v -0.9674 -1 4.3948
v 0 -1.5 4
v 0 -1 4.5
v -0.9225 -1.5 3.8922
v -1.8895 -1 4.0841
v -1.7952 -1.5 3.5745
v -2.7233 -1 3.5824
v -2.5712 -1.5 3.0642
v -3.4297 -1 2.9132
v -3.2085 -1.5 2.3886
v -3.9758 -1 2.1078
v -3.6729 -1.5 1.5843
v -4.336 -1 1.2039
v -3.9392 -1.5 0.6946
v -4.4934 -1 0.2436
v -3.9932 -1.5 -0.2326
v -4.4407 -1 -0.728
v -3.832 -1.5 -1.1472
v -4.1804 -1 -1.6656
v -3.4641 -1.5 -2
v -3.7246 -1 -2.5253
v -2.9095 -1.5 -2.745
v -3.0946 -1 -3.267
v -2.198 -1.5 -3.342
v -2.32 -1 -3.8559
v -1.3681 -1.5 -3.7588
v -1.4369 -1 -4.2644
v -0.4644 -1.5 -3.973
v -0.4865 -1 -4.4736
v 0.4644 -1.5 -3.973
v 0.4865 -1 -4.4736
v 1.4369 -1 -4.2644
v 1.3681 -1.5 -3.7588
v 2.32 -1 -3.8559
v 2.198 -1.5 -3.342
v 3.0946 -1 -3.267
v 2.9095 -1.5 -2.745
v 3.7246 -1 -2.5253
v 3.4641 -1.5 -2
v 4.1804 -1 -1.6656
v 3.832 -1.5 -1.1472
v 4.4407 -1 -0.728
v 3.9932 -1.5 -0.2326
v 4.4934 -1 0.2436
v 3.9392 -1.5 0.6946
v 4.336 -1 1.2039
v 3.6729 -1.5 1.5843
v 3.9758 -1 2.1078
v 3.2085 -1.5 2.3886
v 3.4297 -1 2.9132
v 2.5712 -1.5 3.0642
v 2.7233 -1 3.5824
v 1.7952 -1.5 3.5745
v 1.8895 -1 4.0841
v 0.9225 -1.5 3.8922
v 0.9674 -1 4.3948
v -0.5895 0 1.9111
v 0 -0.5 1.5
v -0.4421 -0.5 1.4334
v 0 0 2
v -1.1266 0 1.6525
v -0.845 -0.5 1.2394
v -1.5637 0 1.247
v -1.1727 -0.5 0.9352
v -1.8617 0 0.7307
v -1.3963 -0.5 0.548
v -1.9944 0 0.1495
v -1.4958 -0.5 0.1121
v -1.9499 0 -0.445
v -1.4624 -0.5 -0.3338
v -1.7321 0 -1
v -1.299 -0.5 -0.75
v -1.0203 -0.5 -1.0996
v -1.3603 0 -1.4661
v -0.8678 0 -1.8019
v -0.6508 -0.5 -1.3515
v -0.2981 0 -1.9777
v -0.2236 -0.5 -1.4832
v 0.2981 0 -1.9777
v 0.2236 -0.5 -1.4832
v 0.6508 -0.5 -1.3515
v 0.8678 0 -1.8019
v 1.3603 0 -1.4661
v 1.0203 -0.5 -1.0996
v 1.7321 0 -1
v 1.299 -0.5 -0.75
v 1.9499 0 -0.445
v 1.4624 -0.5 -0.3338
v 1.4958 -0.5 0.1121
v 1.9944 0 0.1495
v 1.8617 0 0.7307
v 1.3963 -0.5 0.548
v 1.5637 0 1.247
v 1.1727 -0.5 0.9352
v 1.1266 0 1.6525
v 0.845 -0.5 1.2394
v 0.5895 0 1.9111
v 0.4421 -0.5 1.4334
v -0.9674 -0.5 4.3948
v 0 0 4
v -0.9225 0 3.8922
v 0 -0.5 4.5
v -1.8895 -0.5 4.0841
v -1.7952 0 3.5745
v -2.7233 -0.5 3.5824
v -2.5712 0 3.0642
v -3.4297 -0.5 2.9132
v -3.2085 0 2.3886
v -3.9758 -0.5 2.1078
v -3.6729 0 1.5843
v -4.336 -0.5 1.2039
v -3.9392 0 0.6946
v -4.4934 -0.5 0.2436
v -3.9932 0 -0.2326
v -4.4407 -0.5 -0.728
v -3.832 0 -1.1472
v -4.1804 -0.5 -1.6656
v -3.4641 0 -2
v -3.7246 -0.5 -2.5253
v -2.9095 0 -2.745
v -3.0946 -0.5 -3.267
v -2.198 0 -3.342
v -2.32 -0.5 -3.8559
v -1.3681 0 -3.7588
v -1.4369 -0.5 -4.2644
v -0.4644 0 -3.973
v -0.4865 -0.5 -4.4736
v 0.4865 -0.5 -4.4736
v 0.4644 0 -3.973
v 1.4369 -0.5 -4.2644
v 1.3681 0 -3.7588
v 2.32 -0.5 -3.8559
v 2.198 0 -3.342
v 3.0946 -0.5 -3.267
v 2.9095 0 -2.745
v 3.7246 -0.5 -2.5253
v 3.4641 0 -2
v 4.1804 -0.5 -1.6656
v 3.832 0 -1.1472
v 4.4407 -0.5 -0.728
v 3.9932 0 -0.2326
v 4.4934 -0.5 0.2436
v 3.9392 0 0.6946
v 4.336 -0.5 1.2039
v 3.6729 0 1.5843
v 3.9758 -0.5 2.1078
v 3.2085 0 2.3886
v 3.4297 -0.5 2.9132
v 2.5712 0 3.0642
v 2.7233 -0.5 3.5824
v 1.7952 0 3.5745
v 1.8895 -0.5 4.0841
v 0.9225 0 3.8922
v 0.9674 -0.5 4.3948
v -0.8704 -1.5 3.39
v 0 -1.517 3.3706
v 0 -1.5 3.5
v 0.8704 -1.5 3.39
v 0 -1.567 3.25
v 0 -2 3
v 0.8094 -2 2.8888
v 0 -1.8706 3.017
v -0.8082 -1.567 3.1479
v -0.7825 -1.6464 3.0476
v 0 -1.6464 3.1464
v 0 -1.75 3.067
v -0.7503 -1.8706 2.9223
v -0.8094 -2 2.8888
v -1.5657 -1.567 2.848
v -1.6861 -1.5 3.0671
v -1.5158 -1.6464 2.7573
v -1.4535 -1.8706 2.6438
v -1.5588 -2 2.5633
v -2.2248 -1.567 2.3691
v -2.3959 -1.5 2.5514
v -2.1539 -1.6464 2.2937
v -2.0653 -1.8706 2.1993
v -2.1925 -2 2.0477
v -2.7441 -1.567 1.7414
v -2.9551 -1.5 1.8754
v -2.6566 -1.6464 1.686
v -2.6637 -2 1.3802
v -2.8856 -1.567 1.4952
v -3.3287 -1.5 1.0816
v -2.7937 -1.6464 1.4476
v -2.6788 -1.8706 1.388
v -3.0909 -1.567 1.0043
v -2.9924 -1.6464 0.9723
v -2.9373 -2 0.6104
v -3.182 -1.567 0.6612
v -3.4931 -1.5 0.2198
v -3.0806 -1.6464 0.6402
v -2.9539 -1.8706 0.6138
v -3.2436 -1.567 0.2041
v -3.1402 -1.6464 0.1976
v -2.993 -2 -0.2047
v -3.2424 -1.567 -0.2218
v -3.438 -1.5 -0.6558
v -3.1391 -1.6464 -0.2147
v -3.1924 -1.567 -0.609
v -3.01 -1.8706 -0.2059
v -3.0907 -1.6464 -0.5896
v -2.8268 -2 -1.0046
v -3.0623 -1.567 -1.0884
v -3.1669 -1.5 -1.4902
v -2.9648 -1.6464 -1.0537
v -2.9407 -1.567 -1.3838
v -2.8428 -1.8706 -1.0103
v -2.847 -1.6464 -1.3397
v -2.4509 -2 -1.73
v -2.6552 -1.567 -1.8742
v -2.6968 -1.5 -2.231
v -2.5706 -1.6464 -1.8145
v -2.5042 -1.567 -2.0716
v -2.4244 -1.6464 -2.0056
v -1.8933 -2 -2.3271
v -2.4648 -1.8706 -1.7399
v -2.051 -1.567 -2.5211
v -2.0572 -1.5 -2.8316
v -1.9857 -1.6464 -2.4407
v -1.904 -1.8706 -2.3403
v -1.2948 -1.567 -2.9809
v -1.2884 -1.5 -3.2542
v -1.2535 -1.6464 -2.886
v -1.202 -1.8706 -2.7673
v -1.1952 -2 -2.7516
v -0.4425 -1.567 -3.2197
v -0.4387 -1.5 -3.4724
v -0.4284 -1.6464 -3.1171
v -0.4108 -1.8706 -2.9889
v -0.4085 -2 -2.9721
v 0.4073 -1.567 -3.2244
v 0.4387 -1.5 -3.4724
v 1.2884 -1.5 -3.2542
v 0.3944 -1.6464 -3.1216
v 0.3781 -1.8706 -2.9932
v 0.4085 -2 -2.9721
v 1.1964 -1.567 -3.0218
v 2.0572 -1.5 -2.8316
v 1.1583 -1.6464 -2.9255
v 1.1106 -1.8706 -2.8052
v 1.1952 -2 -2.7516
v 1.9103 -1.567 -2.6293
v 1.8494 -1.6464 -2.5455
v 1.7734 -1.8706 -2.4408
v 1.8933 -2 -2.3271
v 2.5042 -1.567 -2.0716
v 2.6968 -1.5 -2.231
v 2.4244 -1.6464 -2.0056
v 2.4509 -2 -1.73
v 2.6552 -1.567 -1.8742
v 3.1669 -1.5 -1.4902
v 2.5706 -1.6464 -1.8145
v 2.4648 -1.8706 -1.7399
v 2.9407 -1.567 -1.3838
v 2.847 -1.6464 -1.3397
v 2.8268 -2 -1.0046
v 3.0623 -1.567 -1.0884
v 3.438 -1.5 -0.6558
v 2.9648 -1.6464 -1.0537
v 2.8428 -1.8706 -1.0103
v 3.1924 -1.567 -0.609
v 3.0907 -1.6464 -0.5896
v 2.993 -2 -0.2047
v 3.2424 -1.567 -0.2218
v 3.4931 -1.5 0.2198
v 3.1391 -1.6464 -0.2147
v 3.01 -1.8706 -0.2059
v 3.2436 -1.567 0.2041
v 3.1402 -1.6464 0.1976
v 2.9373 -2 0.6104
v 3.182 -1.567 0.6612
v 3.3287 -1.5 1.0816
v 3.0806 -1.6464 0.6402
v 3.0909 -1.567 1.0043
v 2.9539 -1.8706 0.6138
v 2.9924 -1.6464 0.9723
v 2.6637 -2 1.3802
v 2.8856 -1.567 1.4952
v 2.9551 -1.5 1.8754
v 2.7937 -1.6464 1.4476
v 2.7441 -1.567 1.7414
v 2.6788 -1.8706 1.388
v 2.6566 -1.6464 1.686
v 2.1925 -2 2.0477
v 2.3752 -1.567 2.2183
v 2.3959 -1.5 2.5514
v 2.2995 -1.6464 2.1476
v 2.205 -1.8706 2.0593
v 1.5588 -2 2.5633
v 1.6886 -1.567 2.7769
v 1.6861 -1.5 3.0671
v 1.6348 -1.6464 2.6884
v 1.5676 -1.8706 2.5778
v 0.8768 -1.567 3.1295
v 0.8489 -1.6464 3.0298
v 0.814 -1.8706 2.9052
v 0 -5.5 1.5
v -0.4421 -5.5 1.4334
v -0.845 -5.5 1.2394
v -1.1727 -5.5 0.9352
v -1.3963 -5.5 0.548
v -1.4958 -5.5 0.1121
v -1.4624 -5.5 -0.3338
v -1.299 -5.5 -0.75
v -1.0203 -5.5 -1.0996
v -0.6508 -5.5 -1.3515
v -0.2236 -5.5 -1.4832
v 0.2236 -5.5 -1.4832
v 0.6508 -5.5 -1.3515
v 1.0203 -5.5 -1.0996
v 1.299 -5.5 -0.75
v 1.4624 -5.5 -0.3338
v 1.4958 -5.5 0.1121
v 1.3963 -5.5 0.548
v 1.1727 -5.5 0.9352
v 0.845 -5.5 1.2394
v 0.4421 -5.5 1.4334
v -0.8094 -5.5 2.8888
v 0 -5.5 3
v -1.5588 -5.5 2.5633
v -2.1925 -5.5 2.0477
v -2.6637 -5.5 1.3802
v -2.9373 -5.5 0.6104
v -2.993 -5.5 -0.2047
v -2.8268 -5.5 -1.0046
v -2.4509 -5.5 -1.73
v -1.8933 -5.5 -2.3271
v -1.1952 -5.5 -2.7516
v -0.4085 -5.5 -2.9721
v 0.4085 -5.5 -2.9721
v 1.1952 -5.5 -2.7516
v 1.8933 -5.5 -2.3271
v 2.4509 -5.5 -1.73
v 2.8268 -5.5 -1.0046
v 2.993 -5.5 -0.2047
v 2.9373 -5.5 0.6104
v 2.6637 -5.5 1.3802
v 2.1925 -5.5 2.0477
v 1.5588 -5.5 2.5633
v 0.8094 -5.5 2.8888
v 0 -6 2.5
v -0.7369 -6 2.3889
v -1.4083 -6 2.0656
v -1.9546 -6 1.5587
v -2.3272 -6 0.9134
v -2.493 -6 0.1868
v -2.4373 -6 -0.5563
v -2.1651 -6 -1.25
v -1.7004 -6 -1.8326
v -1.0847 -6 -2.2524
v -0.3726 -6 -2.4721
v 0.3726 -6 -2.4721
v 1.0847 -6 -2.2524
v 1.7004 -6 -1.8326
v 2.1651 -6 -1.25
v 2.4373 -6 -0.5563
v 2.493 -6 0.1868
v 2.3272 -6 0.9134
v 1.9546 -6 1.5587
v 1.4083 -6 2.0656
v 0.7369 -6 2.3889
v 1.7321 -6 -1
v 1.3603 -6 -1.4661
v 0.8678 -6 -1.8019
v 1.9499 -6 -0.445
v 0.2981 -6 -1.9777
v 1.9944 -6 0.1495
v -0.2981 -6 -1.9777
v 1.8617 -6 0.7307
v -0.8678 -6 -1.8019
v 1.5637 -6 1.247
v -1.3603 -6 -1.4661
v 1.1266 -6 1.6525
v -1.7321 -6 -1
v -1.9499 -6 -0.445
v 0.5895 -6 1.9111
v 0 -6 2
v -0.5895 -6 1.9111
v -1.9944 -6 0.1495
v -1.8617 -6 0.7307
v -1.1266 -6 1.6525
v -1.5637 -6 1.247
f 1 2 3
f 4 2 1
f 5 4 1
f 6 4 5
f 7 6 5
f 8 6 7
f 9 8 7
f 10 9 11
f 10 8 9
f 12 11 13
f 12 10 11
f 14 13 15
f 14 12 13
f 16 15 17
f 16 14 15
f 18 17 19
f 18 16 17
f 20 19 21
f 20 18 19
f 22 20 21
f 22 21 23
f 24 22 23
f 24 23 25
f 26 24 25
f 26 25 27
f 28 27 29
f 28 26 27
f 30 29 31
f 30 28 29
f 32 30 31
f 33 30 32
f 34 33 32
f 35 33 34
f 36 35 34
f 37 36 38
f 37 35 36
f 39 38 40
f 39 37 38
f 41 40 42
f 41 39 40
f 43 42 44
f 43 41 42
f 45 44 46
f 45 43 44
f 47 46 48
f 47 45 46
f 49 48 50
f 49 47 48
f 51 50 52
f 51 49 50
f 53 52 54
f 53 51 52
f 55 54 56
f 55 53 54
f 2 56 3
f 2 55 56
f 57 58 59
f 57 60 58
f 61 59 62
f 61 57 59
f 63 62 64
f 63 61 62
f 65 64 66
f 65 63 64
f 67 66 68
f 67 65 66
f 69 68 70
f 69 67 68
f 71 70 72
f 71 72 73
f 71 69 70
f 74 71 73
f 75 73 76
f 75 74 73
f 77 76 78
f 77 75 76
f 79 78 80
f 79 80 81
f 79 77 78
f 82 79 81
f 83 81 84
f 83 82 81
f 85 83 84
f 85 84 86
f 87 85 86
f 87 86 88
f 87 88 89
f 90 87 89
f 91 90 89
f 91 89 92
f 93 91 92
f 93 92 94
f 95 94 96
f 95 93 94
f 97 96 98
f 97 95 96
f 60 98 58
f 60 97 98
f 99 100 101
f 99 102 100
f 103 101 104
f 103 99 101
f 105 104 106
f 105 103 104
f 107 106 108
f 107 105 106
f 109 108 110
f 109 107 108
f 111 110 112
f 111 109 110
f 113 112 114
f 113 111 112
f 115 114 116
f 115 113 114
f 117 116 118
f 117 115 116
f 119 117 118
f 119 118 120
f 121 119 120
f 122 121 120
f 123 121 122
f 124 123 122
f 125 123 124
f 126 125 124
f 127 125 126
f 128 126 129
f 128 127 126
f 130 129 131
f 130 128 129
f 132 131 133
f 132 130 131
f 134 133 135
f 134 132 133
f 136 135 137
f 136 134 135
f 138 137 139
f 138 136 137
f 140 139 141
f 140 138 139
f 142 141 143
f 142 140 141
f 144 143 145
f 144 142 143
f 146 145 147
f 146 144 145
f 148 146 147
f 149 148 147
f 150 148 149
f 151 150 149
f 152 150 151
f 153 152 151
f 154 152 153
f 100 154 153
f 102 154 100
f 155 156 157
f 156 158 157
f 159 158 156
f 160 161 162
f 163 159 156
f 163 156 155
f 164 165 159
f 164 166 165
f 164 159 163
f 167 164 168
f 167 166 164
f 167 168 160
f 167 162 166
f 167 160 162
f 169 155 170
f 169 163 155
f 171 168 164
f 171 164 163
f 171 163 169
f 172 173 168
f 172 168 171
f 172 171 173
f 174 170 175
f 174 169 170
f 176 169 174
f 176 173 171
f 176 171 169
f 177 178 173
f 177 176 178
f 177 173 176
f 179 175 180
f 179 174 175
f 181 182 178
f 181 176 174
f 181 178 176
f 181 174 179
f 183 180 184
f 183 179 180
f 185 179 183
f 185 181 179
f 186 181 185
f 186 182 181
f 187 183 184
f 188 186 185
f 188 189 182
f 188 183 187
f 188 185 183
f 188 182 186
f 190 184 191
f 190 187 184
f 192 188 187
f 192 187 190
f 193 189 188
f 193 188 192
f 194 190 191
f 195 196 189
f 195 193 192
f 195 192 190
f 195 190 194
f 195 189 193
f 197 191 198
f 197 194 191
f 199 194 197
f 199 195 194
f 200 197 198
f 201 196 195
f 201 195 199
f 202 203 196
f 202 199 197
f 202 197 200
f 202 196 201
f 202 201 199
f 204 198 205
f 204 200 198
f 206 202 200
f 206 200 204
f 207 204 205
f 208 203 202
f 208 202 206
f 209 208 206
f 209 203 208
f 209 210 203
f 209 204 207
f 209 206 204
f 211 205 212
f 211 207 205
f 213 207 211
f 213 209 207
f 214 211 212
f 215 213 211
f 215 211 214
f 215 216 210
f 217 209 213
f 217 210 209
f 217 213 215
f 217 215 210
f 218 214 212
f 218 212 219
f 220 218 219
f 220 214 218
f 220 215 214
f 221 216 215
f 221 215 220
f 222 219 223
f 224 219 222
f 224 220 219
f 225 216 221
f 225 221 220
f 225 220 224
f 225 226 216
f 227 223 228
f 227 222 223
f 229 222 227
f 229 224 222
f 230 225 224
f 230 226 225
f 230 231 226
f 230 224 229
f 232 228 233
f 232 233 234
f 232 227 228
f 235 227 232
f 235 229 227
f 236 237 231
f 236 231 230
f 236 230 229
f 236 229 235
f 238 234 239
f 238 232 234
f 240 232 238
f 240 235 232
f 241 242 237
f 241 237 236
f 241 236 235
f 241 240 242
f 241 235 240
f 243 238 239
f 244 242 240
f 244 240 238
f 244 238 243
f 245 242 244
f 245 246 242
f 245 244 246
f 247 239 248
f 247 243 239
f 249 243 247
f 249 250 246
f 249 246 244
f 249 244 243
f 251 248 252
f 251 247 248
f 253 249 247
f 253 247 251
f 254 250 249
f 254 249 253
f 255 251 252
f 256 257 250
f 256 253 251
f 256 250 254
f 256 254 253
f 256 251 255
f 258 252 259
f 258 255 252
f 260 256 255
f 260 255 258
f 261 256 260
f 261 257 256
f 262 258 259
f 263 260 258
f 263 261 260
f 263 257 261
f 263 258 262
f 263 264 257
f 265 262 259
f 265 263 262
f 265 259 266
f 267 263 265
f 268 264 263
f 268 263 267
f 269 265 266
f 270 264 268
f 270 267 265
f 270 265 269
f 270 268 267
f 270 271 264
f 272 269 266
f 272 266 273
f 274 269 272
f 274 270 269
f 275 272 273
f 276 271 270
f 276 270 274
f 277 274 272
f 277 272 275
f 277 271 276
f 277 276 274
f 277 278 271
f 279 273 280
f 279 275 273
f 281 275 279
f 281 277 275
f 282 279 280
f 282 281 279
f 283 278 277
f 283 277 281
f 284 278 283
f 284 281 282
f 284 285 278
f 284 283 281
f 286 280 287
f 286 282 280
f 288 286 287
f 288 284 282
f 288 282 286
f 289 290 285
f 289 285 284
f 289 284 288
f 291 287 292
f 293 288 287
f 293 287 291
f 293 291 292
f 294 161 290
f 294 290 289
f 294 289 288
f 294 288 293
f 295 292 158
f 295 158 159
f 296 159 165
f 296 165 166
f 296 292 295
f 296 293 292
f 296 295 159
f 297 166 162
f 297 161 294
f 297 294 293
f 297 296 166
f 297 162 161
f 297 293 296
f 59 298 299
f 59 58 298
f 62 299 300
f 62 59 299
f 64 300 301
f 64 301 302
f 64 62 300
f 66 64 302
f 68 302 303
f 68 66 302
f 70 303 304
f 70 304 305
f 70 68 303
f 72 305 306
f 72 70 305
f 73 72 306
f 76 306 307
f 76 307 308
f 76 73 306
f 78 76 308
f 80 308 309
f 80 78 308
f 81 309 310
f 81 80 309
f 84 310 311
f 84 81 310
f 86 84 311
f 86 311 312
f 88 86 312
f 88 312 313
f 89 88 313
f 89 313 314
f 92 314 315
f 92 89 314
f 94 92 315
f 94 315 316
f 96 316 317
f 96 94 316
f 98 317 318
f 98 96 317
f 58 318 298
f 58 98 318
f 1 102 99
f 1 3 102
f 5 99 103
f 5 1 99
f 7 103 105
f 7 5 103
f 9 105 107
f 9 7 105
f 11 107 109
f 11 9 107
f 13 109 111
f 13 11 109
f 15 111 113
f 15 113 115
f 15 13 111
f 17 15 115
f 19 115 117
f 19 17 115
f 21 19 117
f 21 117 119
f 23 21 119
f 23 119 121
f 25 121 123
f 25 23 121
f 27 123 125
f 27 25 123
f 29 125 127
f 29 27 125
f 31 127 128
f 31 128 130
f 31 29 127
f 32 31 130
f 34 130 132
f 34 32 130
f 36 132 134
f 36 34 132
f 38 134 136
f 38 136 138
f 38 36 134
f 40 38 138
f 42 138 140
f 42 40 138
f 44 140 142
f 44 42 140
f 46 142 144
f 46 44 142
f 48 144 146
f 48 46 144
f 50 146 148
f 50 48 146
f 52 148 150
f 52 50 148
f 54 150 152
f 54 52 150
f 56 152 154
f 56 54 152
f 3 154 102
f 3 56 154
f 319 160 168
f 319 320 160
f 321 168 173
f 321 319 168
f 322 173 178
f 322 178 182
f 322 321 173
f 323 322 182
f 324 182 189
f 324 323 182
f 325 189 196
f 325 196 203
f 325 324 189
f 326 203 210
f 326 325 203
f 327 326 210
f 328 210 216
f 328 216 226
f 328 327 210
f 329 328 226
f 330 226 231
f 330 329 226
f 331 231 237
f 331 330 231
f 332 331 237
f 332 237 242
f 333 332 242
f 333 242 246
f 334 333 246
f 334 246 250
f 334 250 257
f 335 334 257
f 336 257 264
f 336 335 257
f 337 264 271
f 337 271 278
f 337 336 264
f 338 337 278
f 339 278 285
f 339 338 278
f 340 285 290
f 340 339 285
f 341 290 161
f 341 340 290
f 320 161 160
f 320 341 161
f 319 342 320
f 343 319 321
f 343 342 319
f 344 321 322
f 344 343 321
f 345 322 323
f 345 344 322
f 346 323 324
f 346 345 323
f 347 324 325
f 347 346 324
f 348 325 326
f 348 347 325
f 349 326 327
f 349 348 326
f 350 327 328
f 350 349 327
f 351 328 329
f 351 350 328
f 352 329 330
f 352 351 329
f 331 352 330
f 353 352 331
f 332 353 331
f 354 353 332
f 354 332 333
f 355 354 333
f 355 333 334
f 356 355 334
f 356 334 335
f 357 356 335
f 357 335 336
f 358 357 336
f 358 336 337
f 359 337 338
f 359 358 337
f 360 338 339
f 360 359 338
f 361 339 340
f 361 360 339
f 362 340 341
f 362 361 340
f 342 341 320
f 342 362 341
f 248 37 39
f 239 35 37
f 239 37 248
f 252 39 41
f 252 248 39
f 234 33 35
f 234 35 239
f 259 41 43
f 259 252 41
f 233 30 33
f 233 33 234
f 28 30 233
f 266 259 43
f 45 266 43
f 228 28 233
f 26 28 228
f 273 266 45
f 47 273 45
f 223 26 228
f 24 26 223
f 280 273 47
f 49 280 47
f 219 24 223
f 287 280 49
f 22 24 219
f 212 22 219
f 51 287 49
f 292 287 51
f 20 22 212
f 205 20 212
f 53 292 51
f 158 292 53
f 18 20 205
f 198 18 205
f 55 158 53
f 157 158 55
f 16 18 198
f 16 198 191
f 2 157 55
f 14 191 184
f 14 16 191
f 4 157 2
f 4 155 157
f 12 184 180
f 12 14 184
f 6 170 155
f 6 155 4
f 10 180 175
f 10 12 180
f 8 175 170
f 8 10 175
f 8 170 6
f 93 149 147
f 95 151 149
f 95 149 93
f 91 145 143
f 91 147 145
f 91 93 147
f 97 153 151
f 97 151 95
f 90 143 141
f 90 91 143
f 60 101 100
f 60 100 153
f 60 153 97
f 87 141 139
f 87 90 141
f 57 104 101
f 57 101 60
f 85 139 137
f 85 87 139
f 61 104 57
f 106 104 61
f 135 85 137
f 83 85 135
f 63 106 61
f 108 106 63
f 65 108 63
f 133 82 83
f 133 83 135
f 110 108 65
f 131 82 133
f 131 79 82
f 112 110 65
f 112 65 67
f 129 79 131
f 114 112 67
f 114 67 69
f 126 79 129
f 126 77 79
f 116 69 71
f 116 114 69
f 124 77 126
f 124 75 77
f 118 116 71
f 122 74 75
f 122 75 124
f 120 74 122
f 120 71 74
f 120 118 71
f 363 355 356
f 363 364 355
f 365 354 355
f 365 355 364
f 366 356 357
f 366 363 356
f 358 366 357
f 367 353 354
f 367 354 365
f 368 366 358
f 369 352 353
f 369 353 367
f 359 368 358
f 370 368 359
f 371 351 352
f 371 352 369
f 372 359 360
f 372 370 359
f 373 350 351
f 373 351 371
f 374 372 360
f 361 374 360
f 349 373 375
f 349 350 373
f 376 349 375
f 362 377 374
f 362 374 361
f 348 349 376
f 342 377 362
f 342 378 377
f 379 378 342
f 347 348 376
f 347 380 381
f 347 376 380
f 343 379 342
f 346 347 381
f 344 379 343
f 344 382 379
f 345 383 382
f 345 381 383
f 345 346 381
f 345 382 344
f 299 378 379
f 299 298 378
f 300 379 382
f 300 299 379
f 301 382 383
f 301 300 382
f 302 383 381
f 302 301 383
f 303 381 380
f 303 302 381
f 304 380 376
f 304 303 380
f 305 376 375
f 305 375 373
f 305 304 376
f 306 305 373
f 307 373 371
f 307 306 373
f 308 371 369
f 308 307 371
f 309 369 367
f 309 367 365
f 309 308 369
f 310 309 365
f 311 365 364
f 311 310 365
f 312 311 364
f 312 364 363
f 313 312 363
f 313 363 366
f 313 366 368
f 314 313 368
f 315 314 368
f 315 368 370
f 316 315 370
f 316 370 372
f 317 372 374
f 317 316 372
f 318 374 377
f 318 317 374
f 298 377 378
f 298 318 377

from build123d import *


with BuildPart() as part:
    # Esquisse1 → Révolution1 (revolve)
    with BuildSketch(Plane.XY, mode=Mode.PRIVATE) as r_volution1_sk:
        with BuildLine():
            Line((2, 0), (4, 0))
            Line((4, 0), (4.5, -0.5))
            Line((4.5, -0.5), (4.5, -1))
            Line((4.5, -1), (4, -1.5))
            Line((4, -1.5), (3.5, -1.5))
            ThreePointArc((3.5, -1.5), (3.146446609, -1.646446609), (3, -2))
            Line((3, -2), (3, -5.5))
            Line((3, -5.5), (2.5, -6))
            Line((2.5, -6), (2, -6))
            Line((2, -6), (1.5, -5.5))
            Line((1.5, -5.5), (1.5, -0.5))
            Line((1.5, -0.5), (2, 0))
        make_face()
    revolve(r_volution1_sk.sketch.rotate(Axis((0, 0, 0), (0, -1, 0)), 90), axis=Axis((0, 0, 0), (0, -1, 0)))


solid = part.part
